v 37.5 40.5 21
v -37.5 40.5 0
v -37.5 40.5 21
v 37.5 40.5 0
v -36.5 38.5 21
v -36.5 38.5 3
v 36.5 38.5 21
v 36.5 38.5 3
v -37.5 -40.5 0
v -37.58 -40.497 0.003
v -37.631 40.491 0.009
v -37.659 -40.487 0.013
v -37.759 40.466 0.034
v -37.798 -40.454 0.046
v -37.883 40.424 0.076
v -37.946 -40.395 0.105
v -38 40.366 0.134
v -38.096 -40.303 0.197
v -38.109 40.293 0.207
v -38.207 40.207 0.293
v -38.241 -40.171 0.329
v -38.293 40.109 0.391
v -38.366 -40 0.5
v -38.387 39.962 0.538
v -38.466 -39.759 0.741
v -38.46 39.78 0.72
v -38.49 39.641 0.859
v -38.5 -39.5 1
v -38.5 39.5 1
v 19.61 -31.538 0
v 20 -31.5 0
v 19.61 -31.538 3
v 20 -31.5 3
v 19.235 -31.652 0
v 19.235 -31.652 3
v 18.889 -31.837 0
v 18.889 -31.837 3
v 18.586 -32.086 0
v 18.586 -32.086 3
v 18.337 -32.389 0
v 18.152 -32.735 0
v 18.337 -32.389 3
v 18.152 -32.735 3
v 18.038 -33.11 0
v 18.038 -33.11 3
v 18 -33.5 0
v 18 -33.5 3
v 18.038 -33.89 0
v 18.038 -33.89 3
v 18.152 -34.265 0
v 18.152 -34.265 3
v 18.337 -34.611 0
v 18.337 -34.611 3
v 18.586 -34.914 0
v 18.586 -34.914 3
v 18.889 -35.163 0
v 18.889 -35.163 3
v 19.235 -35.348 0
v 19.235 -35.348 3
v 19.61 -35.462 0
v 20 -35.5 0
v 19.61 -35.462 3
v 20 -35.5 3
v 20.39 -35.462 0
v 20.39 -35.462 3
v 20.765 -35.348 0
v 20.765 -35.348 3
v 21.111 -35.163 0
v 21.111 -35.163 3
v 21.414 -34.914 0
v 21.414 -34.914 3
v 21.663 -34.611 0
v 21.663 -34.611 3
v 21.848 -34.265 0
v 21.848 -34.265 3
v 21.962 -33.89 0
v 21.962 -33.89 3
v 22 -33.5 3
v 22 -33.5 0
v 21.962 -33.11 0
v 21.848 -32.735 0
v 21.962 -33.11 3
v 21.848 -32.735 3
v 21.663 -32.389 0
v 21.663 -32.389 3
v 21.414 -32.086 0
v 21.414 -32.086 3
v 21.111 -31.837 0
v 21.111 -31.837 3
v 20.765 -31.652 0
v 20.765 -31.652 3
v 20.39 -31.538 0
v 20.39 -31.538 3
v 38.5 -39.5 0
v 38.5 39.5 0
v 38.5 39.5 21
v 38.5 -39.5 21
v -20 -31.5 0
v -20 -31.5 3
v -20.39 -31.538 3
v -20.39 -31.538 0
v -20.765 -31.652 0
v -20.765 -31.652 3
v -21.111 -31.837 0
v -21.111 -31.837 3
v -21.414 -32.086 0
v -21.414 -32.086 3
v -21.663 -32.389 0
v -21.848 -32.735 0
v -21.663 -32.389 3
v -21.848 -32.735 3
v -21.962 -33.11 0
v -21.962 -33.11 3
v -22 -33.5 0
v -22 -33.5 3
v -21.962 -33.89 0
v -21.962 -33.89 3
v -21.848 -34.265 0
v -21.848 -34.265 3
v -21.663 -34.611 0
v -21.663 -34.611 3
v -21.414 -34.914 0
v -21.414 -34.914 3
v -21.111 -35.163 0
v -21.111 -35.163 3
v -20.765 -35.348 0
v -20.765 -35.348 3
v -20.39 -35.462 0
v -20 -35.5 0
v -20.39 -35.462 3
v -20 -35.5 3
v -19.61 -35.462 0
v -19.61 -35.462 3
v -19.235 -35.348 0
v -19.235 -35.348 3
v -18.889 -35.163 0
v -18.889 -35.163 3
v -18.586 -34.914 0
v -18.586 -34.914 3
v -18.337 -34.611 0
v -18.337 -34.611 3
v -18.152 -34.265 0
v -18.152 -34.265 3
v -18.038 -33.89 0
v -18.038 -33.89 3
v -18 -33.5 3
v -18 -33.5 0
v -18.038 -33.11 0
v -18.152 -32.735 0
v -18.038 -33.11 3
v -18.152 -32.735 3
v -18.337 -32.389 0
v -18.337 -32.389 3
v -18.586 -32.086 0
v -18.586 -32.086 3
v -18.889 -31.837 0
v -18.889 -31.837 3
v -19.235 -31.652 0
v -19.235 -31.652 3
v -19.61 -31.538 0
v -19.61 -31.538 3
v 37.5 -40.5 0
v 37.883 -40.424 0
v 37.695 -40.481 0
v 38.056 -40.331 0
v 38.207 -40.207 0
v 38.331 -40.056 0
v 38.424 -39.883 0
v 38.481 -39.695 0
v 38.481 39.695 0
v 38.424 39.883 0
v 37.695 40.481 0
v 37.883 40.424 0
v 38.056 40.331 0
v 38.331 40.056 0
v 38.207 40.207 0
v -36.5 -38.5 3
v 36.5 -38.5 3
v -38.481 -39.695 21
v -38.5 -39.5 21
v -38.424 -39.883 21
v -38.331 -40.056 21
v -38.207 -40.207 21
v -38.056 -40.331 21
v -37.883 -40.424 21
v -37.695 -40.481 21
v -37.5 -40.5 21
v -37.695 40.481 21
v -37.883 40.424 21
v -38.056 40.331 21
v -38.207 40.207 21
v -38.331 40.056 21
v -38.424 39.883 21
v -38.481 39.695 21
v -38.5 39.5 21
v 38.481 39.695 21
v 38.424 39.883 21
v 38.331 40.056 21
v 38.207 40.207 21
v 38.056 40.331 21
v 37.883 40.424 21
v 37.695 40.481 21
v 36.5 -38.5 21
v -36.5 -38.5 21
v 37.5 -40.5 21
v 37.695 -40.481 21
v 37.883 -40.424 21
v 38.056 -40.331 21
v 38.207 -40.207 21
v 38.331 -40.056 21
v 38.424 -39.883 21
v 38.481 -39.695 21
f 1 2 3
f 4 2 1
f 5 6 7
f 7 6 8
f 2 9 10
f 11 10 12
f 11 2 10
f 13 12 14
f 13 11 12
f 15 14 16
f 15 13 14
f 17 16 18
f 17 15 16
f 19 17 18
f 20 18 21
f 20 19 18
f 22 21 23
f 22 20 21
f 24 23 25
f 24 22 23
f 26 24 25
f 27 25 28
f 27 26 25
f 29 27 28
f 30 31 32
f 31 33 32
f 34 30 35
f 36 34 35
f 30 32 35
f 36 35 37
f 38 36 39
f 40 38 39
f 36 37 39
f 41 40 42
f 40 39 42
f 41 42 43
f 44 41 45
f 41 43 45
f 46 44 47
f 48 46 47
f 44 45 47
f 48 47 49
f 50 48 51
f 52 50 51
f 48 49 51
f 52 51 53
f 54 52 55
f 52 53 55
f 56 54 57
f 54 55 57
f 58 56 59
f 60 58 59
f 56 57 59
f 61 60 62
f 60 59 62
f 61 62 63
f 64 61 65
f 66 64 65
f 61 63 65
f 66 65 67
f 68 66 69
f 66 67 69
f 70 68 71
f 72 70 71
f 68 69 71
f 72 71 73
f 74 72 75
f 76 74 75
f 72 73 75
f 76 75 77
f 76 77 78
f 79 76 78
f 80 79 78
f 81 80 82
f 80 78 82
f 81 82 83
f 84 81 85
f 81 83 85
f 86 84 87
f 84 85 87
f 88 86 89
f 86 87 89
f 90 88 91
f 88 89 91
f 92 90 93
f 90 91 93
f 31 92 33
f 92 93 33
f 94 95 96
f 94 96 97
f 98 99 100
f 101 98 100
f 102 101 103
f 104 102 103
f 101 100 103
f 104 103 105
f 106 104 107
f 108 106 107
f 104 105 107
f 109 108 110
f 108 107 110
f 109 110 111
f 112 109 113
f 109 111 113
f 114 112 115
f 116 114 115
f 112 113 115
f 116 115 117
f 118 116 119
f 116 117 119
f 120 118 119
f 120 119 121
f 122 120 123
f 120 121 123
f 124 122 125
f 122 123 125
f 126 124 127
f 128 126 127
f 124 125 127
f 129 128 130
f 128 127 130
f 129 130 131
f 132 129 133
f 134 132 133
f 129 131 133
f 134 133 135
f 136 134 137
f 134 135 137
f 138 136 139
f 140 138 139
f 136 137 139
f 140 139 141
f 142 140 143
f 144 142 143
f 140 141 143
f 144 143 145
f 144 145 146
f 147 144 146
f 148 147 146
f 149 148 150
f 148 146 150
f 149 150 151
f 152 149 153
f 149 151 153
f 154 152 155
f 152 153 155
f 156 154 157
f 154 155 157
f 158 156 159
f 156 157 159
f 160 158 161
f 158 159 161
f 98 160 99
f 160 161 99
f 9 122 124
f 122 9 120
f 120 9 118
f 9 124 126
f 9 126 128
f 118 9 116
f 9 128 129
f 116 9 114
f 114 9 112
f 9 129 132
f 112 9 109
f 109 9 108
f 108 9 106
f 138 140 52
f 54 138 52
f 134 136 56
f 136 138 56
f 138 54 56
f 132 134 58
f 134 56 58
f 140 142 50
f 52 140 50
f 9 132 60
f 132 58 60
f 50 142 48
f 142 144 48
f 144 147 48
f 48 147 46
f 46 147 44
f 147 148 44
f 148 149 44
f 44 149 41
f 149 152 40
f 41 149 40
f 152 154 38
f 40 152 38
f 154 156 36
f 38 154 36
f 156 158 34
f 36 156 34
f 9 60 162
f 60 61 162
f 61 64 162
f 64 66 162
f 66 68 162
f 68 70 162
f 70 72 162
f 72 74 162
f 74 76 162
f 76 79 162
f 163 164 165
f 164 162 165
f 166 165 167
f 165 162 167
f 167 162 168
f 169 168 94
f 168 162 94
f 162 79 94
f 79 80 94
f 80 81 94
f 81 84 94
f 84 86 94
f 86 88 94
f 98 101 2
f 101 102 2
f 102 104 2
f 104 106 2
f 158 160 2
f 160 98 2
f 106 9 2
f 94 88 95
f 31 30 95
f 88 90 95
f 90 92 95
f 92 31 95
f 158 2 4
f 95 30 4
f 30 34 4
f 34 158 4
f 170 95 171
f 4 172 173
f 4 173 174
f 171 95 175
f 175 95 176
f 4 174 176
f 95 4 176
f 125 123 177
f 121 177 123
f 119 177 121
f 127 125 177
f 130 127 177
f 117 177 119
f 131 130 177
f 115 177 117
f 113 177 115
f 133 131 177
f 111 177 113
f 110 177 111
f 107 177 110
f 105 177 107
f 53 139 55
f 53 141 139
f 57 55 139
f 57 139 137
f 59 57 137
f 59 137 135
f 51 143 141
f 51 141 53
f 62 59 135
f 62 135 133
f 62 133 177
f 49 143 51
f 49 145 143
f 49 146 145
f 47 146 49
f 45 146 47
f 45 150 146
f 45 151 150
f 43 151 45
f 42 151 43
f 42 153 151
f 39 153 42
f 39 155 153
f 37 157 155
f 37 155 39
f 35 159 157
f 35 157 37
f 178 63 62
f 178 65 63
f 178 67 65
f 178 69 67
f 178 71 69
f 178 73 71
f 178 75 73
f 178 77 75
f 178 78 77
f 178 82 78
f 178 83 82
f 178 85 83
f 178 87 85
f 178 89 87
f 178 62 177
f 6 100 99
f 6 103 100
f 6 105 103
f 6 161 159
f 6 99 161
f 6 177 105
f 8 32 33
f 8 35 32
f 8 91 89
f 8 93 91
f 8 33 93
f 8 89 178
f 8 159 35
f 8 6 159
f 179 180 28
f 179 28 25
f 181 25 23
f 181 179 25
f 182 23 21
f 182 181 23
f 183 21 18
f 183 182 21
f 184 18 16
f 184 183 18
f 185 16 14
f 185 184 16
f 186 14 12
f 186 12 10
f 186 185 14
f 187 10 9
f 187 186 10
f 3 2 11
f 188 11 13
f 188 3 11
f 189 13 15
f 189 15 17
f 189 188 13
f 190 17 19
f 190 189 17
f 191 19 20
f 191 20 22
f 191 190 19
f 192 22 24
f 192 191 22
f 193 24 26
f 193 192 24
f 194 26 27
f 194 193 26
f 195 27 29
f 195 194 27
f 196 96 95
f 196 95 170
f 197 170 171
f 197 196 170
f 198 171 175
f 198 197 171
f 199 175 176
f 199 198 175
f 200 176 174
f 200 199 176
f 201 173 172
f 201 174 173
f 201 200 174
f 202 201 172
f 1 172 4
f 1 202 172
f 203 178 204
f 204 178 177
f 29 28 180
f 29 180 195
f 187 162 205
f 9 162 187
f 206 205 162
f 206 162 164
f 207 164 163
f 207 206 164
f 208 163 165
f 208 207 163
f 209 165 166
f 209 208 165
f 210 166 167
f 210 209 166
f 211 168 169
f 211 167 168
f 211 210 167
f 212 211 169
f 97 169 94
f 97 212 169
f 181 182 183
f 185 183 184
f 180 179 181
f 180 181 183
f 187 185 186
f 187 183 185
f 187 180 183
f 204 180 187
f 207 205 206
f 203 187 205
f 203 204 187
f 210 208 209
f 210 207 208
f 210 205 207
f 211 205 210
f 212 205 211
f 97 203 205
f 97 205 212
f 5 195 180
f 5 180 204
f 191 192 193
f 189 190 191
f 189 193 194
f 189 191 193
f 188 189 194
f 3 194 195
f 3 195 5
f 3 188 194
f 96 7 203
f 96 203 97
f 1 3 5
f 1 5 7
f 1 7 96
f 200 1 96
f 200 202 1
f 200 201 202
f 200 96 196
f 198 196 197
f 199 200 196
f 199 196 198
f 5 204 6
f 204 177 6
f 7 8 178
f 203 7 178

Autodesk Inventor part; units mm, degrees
ref_plane "YZ Plane" through (0, 0, 0) normal (1, 0, 0) x (0, 1, 0)
ref_plane "XZ Plane" through (0, 0, 0) normal (0, 1, 0) x (-1, 0, 0)
ref_plane "XY Plane" through (0, 0, 0) normal (0, 0, 1) x (1, 0, 0)
sketch "Sketch_BoxBase" plane through (0, 0, 0) normal (0, 0, 1) x (1, 0, 0)
  line L0 (0, 56.7) -> (0, -56.7) construction
  line L1 (-53.9, 0) -> (53.9, 0) construction
  line L2 (-36.5, 38.5) -> (36.5, 38.5)
  line L3 (36.5, 38.5) -> (36.5, -38.5)
  line L4 (36.5, -38.5) -> (-36.5, -38.5)
  line L5 (-36.5, -38.5) -> (-36.5, 38.5)
  line L6 (-36.5, 38.5) -> (36.5, -38.5) construction
  line L7 (36.5, 38.5) -> (-36.5, -38.5) construction
  line L8 (-38.5, 40.5) -> (38.5, 40.5)
  line L9 (38.5, 40.5) -> (38.5, -40.5)
  line L10 (38.5, -40.5) -> (-38.5, -40.5)
  line L11 (-38.5, -40.5) -> (-38.5, 40.5)
  line L12 (-38.5, 40.5) -> (38.5, -40.5) construction
  line L13 (38.5, 40.5) -> (-38.5, -40.5) construction
  point P0 (0, 0)
  point P1 (-20, -33.5)
  point P2 (20, -33.5)
  dimension "d4" = 73
  dimension "d5" = 77
  dimension "d6" = 77
  dimension "d7" = 81
  dimension "d23" = 40
  dimension "d24" = 20
  dimension "d25" = 7
  dimension "d26" = 7
extrude "Extr_Edge" add sketch "Sketch_BoxBase" along normal blind 21
extrude "Extr_Bottom" add sketch "Sketch_BoxBase" along normal blind 3 contours L2 L3 L4 L5
hole "Hole2" at (-20, -33.5, 0) at (20, -33.5, 0) direction (0, 0, 1) diameter 4 end through all
fillet "Fillet1" radius 1 1 edges at (38.5, 40.5, 10.5)
fillet "Fillet2" radius 1 4 edges at (-38.5, 40.5, 10.5) (-38.5, -40.5, 10.5) (38.5, -40.5, 10.5) (-38.5, 0, 0)
equation "\"d24\" = 0.5 * d23"
equation "\"d26\" = d25"
properties part number "Enclosure"
